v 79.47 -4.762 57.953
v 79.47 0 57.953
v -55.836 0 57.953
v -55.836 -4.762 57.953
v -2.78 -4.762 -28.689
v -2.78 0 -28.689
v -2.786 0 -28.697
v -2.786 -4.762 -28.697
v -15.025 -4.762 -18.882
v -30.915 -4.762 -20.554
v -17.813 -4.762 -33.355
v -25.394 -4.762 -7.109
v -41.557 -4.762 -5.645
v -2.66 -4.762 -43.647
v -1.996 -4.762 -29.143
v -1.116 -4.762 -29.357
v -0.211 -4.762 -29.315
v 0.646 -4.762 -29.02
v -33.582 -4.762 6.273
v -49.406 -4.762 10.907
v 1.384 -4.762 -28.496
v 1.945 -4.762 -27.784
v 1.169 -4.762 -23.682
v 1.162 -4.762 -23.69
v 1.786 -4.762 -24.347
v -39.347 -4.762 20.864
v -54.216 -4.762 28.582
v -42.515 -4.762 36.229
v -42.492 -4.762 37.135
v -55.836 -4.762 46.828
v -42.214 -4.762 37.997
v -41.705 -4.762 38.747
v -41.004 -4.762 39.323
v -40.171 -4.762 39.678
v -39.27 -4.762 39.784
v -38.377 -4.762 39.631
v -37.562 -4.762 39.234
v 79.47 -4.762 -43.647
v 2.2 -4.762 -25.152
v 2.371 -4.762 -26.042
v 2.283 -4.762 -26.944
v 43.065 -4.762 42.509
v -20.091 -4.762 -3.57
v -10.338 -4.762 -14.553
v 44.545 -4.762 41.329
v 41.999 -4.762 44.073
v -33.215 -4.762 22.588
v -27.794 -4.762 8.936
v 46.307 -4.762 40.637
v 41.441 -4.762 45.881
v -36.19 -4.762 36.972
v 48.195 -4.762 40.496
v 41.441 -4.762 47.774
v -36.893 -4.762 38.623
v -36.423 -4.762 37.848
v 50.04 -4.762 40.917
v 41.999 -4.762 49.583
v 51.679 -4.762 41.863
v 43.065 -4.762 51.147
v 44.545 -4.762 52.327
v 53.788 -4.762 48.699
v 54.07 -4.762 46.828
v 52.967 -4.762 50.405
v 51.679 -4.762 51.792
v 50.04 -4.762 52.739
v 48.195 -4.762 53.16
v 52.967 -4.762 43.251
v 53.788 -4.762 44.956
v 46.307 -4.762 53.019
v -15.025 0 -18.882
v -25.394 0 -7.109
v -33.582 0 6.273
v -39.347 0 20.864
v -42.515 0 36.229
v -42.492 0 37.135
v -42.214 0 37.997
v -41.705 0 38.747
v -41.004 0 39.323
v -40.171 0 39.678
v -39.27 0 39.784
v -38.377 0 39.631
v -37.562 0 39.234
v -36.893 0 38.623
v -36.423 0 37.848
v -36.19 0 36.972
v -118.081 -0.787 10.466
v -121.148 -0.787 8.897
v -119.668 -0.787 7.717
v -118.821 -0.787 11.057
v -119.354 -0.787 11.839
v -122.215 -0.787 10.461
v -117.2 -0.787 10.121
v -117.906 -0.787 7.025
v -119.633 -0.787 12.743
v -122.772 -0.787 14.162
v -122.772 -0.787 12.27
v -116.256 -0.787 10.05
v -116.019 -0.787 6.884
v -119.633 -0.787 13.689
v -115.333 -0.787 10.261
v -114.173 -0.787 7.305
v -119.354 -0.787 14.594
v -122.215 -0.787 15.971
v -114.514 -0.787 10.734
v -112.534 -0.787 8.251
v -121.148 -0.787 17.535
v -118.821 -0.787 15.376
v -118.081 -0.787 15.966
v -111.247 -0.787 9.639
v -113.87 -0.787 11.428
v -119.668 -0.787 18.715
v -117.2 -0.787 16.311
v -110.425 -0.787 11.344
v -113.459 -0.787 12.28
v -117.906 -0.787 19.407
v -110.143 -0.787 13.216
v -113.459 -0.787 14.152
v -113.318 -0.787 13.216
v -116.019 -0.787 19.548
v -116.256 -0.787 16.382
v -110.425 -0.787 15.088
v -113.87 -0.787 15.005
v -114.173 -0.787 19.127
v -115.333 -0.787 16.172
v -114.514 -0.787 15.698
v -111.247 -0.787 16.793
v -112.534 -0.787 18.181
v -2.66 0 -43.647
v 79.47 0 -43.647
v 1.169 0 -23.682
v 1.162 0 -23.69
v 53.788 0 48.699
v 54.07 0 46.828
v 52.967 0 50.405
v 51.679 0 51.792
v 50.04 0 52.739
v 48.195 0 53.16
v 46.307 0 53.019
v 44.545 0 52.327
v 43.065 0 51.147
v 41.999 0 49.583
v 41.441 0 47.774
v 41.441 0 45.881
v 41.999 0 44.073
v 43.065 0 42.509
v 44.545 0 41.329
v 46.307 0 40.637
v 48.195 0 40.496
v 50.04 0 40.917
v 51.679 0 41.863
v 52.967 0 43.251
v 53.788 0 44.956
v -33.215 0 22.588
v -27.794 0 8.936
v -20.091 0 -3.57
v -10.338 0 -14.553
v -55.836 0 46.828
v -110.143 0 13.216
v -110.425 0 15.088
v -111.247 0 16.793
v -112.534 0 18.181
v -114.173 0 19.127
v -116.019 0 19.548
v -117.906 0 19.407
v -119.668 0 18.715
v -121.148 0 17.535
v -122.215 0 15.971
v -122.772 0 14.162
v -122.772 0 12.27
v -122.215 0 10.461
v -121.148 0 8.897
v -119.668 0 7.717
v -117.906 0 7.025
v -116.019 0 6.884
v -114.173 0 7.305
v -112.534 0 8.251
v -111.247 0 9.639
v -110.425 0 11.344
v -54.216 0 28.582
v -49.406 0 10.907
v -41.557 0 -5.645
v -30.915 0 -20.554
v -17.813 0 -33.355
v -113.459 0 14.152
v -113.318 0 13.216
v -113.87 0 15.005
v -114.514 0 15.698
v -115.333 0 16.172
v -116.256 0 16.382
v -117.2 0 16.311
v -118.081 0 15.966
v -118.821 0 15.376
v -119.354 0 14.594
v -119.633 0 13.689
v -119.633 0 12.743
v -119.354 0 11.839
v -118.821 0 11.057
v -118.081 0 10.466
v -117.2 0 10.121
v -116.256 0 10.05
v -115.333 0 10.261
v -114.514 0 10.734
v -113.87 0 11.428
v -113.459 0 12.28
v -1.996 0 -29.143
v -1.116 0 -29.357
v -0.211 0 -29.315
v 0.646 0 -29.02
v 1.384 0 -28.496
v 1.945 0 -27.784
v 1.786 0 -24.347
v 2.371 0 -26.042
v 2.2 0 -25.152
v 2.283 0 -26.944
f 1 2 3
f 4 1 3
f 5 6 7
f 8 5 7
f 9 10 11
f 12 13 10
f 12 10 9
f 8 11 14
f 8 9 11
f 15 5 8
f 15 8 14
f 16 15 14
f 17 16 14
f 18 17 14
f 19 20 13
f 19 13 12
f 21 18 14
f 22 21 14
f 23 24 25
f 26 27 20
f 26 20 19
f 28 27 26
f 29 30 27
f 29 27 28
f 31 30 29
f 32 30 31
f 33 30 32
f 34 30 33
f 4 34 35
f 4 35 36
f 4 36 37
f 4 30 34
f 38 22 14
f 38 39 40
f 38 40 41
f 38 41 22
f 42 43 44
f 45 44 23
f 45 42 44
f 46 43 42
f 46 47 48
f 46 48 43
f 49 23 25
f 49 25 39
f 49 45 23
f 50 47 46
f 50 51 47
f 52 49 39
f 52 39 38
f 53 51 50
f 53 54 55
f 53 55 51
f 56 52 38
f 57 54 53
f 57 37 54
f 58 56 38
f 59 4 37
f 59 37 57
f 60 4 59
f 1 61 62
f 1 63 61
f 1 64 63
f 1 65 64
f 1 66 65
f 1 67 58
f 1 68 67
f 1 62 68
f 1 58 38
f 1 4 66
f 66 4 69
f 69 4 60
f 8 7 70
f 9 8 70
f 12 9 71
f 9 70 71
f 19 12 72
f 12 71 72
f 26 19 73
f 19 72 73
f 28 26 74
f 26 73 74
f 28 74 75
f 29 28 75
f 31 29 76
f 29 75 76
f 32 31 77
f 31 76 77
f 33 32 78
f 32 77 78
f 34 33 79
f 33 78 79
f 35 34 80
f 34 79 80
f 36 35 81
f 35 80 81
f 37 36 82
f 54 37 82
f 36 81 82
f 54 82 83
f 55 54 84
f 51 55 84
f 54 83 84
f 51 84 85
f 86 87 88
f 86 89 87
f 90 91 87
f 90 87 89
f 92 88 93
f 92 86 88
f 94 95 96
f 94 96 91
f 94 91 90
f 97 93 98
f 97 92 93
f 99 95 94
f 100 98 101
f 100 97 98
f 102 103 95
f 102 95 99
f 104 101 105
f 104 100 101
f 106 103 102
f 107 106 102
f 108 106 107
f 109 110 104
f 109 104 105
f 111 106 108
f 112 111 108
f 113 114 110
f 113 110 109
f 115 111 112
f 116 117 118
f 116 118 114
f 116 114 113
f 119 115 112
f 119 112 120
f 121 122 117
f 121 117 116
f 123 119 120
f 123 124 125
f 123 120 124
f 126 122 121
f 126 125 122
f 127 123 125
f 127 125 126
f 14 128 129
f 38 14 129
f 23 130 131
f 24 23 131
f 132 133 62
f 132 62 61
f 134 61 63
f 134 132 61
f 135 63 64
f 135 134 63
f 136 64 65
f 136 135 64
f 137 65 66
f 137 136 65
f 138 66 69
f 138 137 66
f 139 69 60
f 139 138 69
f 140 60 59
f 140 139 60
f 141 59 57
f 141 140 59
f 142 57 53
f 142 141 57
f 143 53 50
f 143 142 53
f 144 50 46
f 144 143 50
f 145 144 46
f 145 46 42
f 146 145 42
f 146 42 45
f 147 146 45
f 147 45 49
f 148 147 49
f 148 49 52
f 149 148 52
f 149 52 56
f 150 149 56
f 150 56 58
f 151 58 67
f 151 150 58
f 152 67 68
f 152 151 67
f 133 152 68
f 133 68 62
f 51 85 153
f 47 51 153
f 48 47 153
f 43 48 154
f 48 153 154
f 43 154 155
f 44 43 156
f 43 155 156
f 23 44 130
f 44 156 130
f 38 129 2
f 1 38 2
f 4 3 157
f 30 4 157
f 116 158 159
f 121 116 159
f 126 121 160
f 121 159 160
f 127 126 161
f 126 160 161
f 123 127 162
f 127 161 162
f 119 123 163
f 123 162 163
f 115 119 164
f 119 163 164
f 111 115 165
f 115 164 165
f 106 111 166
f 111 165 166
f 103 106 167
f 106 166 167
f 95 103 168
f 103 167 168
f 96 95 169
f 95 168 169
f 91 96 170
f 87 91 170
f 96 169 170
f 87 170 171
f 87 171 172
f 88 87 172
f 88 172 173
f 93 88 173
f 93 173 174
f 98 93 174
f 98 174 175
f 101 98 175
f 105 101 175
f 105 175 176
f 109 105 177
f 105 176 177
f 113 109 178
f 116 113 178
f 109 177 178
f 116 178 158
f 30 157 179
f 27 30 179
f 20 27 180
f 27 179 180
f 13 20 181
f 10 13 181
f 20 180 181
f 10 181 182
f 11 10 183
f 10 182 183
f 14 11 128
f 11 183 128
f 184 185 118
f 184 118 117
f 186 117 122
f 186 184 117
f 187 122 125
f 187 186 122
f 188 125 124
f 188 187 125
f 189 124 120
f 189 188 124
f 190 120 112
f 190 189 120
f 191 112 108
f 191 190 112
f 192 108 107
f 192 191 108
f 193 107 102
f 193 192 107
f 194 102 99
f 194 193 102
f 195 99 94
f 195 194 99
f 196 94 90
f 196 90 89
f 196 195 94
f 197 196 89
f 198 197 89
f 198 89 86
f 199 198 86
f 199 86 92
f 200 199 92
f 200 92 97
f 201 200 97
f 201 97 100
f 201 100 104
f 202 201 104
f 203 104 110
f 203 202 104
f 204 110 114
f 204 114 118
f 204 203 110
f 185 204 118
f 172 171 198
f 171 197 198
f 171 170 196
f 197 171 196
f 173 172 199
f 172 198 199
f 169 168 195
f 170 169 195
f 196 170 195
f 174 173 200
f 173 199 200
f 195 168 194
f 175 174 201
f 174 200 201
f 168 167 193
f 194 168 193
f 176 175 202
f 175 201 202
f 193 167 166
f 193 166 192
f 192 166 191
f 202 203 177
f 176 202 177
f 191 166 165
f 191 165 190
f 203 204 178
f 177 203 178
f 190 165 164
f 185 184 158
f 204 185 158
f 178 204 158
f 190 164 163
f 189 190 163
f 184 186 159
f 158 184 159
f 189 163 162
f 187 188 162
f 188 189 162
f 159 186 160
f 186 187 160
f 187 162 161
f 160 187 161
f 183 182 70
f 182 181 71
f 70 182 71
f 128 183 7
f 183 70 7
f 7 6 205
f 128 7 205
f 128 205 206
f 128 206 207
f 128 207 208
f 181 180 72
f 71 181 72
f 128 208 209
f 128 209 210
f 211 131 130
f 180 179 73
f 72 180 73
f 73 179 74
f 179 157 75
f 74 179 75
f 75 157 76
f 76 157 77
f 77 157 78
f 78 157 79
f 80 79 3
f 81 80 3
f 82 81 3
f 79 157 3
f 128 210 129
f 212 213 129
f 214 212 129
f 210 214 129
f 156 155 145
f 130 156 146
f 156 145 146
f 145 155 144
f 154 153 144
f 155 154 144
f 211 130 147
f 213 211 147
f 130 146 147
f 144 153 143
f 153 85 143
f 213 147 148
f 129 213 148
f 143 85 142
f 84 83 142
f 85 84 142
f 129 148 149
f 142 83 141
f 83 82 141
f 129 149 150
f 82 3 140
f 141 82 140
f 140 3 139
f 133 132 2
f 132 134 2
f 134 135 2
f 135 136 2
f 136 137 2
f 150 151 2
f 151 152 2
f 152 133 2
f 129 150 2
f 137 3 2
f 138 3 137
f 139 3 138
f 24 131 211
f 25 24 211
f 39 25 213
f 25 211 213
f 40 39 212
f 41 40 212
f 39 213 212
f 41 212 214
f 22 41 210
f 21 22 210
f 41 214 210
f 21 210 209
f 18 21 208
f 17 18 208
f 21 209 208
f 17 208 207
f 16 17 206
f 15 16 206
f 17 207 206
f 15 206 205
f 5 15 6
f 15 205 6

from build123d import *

# Parameters (mm, degrees)
F0_R     = 6.35
F1_DEPTH = 4.7625
F2_R     = 6.35
F2_R_2   = 3.175
F3_DEPTH = 0.7874


with BuildPart() as f1:
    # F0 (on Front) → F1 (new body)
    with BuildSketch(Plane.XZ):
        with BuildLine():
            Line((-2.65973, -43.647013), (79.469971, -43.647013))
            Line((79.469971, -43.647013), (79.469971, 57.952987))
            Line((79.469971, 57.952987), (-55.835829, 57.952987))
            Line((-55.835829, 57.952987), (-55.835829, 46.827787))
            ThreePointArc((-55.835829, 46.827787), (-41.557445, -5.644556), (-2.65973, -43.647013))
        make_face()
        with BuildLine():
            ThreePointArc((-2.785994, -28.69654), (-29.777461, -0.59504), (-42.515458, 36.228554))
            ThreePointArc((-42.515458, 36.228554), (-39.724181, 39.762845), (-36.18989, 36.971568))
            ThreePointArc((-36.18989, 36.971568), (-24.214698, 2.515675), (1.16875, -23.681545))
            Line((1.16875, -23.681545), (1.16201, -23.690093))
            ThreePointArc((1.16201, -23.690093), (1.69039, -28.160198), (-2.779715, -28.688578))
            Line((-2.779715, -28.688578), (-2.785994, -28.69654))
        make_face(mode=Mode.SUBTRACT)
        with Locations((47.719971, 46.827787)):
            Circle(F0_R, mode=Mode.SUBTRACT)
    extrude(amount=F1_DEPTH)


with BuildPart() as f3:
    # F2 (on Front) → F3 (new body)
    with BuildSketch(Plane.XZ):
        with Locations((-116.493374, 13.216081)):
            Circle(F2_R)
        with Locations((-116.493374, 13.216081)):
            Circle(F2_R_2, mode=Mode.SUBTRACT)
    extrude(amount=F3_DEPTH)


solid = Compound([f1.part, f3.part])
